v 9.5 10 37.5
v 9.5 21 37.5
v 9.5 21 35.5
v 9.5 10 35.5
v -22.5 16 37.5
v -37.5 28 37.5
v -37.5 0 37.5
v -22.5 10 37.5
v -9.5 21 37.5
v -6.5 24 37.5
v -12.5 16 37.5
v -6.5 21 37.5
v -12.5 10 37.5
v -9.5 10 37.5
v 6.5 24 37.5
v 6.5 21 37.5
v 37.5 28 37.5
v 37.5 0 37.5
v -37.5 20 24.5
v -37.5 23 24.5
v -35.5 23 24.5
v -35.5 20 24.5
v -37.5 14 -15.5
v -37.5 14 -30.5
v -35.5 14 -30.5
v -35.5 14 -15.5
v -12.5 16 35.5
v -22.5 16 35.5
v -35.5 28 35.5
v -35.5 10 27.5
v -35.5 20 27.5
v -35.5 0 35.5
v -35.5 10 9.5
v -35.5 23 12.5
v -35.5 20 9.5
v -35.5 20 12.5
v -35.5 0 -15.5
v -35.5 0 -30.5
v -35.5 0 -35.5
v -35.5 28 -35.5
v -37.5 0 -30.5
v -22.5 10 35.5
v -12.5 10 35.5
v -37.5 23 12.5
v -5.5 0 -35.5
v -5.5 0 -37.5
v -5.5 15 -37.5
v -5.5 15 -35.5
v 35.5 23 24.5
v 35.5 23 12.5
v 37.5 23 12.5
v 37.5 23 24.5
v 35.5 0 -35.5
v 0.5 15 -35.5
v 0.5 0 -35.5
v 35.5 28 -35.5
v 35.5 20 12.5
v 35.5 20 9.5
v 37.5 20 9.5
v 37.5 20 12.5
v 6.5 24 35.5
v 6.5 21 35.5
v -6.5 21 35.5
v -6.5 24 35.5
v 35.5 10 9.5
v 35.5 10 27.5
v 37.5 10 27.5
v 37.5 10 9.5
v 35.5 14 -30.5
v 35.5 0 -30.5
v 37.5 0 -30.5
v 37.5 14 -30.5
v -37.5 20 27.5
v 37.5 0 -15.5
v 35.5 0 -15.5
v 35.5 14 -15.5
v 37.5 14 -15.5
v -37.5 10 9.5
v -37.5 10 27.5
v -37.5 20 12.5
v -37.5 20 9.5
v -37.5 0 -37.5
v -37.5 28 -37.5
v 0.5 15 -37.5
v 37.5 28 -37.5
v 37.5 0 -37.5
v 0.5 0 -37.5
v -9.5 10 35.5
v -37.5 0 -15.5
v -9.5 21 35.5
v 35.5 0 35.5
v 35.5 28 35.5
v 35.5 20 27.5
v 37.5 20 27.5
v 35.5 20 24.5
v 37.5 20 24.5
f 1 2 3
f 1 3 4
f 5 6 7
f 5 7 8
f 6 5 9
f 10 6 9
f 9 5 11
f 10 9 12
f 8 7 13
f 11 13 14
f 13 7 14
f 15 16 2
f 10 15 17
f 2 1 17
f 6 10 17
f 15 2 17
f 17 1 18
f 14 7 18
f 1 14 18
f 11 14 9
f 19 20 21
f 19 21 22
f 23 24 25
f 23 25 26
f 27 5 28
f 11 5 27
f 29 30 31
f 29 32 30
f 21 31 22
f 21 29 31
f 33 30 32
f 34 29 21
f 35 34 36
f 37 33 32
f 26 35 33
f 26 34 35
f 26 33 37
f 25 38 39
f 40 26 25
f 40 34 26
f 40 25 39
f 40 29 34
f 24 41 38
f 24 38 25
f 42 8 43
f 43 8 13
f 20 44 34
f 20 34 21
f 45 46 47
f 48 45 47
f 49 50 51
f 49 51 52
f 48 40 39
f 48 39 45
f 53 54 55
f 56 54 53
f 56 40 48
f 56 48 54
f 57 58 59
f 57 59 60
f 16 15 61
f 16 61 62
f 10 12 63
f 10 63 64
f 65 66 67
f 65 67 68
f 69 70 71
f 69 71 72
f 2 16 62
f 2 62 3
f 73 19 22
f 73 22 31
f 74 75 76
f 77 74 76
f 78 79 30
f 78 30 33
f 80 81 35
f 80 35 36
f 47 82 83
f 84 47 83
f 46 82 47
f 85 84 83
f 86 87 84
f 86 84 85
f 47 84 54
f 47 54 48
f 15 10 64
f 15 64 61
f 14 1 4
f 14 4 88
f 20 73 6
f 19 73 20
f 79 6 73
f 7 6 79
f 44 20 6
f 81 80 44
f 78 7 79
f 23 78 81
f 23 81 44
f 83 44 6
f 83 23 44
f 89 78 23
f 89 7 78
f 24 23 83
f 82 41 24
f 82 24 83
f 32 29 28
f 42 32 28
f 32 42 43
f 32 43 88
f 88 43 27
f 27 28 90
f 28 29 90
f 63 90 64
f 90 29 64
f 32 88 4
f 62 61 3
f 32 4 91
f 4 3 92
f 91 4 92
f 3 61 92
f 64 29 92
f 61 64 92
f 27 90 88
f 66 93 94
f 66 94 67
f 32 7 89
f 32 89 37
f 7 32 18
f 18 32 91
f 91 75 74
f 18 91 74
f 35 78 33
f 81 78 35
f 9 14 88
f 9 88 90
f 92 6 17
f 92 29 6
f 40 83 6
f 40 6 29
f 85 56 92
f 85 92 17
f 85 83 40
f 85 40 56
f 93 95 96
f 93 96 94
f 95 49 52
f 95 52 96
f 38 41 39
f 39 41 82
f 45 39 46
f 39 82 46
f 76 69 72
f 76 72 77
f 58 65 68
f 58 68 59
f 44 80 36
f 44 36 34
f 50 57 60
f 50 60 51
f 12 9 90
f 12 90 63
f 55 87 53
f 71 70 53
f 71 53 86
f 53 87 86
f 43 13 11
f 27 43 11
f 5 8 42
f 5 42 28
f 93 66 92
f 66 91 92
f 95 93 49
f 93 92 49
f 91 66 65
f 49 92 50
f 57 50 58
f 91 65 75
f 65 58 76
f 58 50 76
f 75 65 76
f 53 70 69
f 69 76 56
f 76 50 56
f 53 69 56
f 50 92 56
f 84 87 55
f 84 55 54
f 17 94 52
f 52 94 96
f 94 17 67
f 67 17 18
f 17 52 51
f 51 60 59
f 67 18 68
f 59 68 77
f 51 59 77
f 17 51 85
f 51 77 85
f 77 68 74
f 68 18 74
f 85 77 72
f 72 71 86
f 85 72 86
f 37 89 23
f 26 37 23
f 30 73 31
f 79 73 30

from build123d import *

# Parameters (mm, degrees)
SKETCH1_W           = 75
SKETCH1_H           = 75
BOSS_EXTRUDE1_DEPTH = 28
SKETCH2_W           = 71
SKETCH2_H           = 71
CUT_EXTRUDE1_DEPTH  = 29
SKETCH3_W           = 10
SKETCH3_H           = 6
CUT_EXTRUDE2_DEPTH  = 2
SKETCH4_W           = 15
SKETCH4_H           = 14
CUT_EXTRUDE3_DEPTH  = 76
SKETCH5_W           = 6
SKETCH5_H           = 15
CUT_EXTRUDE4_DEPTH  = 2


with BuildPart() as part:
    # Sketch1 → Boss-Extrude1 (new body)
    with BuildSketch(Plane(origin=(0, 0, 0), x_dir=(1, 0, 0), z_dir=(0, 1, 0))):
        Rectangle(SKETCH1_W, SKETCH1_H)
    extrude(amount=BOSS_EXTRUDE1_DEPTH)

    # Sketch2 → Cut-Extrude1 (cut, through all)
    with BuildSketch(Plane(origin=(0, 28, 0), x_dir=(1, 0, 0), z_dir=(0, 1, 0))):
        Rectangle(SKETCH2_W, SKETCH2_H)
    extrude(amount=-CUT_EXTRUDE1_DEPTH, mode=Mode.SUBTRACT)

    # Sketch3 → Cut-Extrude2 (cut)
    with BuildSketch(Plane.XY.offset(37.5)):
        with Locations((-17.5, 13)):
            Rectangle(SKETCH3_W, SKETCH3_H)
        Polygon((-6.5, 24), (6.5, 24), (6.5, 21), (9.5, 21), (9.5, 10), (-9.5, 10), (-9.5, 21), (-6.5, 21), align=None)
    extrude(amount=-CUT_EXTRUDE2_DEPTH, mode=Mode.SUBTRACT)

    # Sketch4 → Cut-Extrude3 (cut, through all)
    with BuildSketch(Plane.ZY.offset(37.5)):
        Polygon((12.5, 23), (24.5, 23), (24.5, 20), (27.5, 20), (27.5, 10), (9.5, 10), (9.5, 20), (12.5, 20), align=None)
        with Locations((-23, 7)):
            Rectangle(SKETCH4_W, SKETCH4_H)
    extrude(amount=-CUT_EXTRUDE3_DEPTH, mode=Mode.SUBTRACT)

    # Sketch5 → Cut-Extrude4 (cut)
    with BuildSketch(Plane(origin=(0, 0, -37.5), x_dir=(-1, 0, 0), z_dir=(0, 0, -1))):
        with Locations((2.5, 7.5)):
            Rectangle(SKETCH5_W, SKETCH5_H)
    extrude(amount=-CUT_EXTRUDE4_DEPTH, mode=Mode.SUBTRACT)


solid = part.part
